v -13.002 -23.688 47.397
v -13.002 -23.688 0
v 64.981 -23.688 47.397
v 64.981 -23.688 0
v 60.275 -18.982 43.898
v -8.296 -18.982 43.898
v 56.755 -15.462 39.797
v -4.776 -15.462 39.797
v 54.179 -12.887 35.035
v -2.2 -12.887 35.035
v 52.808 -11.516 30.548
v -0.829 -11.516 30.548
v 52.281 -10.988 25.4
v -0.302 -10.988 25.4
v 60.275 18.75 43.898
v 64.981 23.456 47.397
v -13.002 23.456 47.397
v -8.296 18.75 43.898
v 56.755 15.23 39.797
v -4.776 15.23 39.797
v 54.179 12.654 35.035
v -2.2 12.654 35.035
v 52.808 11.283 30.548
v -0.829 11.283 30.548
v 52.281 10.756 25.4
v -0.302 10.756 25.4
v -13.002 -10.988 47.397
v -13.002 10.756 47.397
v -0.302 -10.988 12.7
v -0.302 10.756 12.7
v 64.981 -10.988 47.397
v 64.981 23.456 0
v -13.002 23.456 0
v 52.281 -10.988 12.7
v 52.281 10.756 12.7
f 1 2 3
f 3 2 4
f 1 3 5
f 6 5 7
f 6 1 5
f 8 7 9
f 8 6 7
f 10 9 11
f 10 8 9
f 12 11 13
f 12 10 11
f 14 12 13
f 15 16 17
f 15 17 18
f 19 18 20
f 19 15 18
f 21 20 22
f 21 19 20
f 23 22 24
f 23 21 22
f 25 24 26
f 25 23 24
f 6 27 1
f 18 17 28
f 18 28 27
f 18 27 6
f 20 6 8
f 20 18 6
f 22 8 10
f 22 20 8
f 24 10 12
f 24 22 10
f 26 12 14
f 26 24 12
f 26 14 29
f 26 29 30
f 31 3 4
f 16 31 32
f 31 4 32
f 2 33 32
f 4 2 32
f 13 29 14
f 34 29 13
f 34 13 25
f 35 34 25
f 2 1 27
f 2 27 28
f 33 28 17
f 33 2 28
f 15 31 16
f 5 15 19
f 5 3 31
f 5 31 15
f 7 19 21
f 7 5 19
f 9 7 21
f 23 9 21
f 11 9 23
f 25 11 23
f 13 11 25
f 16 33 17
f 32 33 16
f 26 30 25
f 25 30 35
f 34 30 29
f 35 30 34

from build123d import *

# Parameters (mm, degrees)
F0_W         = 77.9829304665
F0_H         = 47.1442025155
F1_DEPTH     = 50.8
F2_T         = -12.7
F3_T1_DEPTH  = 52.5829304665
F3_T3_DEPTH  = 21.7442025155
F3_T9_DEPTH  = 116.0829304665
F3_T15_DEPTH = 85.2442025155
F3_T24_DEPTH = 116.0829304665
F3_T30_DEPTH = 85.2442025155
F3_T39_DEPTH = 116.0829304665
F3_T45_DEPTH = 85.2442025155
F3_T54_DEPTH = 85.2442025155
F3_T60_DEPTH = 116.0829304665


# Not quite as in the source:
# - a fillet or chamfer that OpenCascade refuses, or shapes differently, is made with other operations: its cross-section is extruded or revolved along the edge and cut away or added


with BuildPart() as f1:
    # F0 (on Top) → F1 (new body)
    with BuildSketch(Plane.XY):
        with Locations((25.9893098846, -0.1163231209)):
            Rectangle(F0_W, F0_H)
    extrude(amount=F1_DEPTH)

    # F2
    f2_openings = [f1.faces().sort_by_distance(p)[0] for p in [
        (25.98931, -0.116323, 50.8),
    ]]
    offset(amount=F2_T, openings=f2_openings)

    # F3: fillet of radius 25.4 on 4 edges, made by hand

    # F3_s2 → F3_t1 (cut)
    with BuildSketch(Plane.YZ.offset(-0.3021553487)):
        with BuildLine():
            ThreePointArc((36.1557781368, 50.8), (18.1952658947, 43.3605122421), (10.7557781368, 25.4))
            Line((10.7557781368, 25.4), (10.7557781368, 50.8))
            Line((10.7557781368, 50.8), (36.1557781368, 50.8))
        make_face()
        with BuildLine():
            ThreePointArc((-36.3884243786, 50.8), (-18.4279121365, 43.3605122421), (-10.9884243786, 25.4))
            Line((-10.9884243786, 25.4), (-10.9884243786, 50.8))
            Line((-10.9884243786, 50.8), (-36.3884243786, 50.8))
        make_face()
    extrude(amount=F3_T1_DEPTH, mode=Mode.SUBTRACT)

    # F3_s4 → F3_t3 (cut)
    with BuildSketch(Plane.XZ.offset(-10.7557781368)):
        with BuildLine():
            ThreePointArc((-25.7021553487, 50.8), (-7.7416431065, 43.3605122421), (-0.3021553487, 25.4))
            Line((-0.3021553487, 25.4), (-0.3021553487, 50.8))
            Line((-0.3021553487, 50.8), (-25.7021553487, 50.8))
        make_face()
        with BuildLine():
            ThreePointArc((77.6807751179, 50.8), (59.7202628757, 43.3605122421), (52.2807751179, 25.4))
            Line((52.2807751179, 25.4), (52.2807751179, 50.8))
            Line((52.2807751179, 50.8), (77.6807751179, 50.8))
        make_face()
    extrude(amount=F3_T3_DEPTH, mode=Mode.SUBTRACT)


with BuildPart() as f3_tool7:
    # F3_s8 → F3_t9 (new body)
    with BuildSketch(Plane.YZ.offset(115.7807751179)):
        with BuildLine():
            ThreePointArc((36.1557781368, 50.8), (18.1952658947, 43.3605122421), (10.7557781368, 25.4))
            Line((10.7557781368, 25.4), (10.7557781368, 50.8))
            Line((10.7557781368, 50.8), (36.1557781368, 50.8))
        make_face()
    extrude(amount=-F3_T9_DEPTH)

    split(bisect_by=Plane.XZ.offset(-23.4557781368), keep=Keep.TOP)

    split(bisect_by=Plane.YZ.offset(64.9807751179), keep=Keep.BOTTOM)

    split(bisect_by=Plane.YZ.offset(52.2807751179), keep=Keep.TOP)


with BuildPart() as f3_tool13:
    # F3_s14 → F3_t15 (new body)
    with BuildSketch(Plane.XZ.offset(10.9884243786)):
        with BuildLine():
            ThreePointArc((77.6807751179, 50.8), (59.7202628757, 43.3605122421), (52.2807751179, 25.4))
            Line((52.2807751179, 25.4), (52.2807751179, 50.8))
            Line((52.2807751179, 50.8), (77.6807751179, 50.8))
        make_face()
    extrude(amount=-F3_T15_DEPTH)

    split(bisect_by=Plane.XZ.offset(-23.4557781368), keep=Keep.TOP)

    split(bisect_by=Plane.YZ.offset(64.9807751179), keep=Keep.BOTTOM)

    split(bisect_by=Plane.XZ.offset(-10.7557781368), keep=Keep.BOTTOM)


with BuildPart() as f3_tool7_1:
    add(f3_tool7.part)

    # F3_t19: intersect F3_tool13
    add(f3_tool13.part, mode=Mode.INTERSECT)


with BuildPart() as f1_1:
    add(f1.part)

    # F3_t5: cut F3_tool7
    add(f3_tool7_1.part, mode=Mode.SUBTRACT)


with BuildPart() as f3_tool22:
    # F3_s23 → F3_t24 (new body)
    with BuildSketch(Plane.YZ.offset(52.2807751179)):
        with BuildLine():
            ThreePointArc((36.1557781368, 50.8), (18.1952658947, 43.3605122421), (10.7557781368, 25.4))
            Line((10.7557781368, 25.4), (10.7557781368, 50.8))
            Line((10.7557781368, 50.8), (36.1557781368, 50.8))
        make_face()
    extrude(amount=-F3_T24_DEPTH)

    split(bisect_by=Plane.XZ.offset(-23.4557781368), keep=Keep.TOP)

    split(bisect_by=Plane.YZ.offset(-13.0021553487), keep=Keep.TOP)

    split(bisect_by=Plane.YZ.offset(-0.3021553487), keep=Keep.BOTTOM)


with BuildPart() as f3_tool28:
    # F3_s29 → F3_t30 (new body)
    with BuildSketch(Plane.XZ.offset(-74.2557781368)):
        with BuildLine():
            ThreePointArc((-25.7021553487, 50.8), (-7.7416431065, 43.3605122421), (-0.3021553487, 25.4))
            Line((-0.3021553487, 25.4), (-0.3021553487, 50.8))
            Line((-0.3021553487, 50.8), (-25.7021553487, 50.8))
        make_face()
    extrude(amount=F3_T30_DEPTH)

    split(bisect_by=Plane.XZ.offset(-23.4557781368), keep=Keep.TOP)

    split(bisect_by=Plane.YZ.offset(-13.0021553487), keep=Keep.TOP)

    split(bisect_by=Plane.XZ.offset(-10.7557781368), keep=Keep.BOTTOM)


with BuildPart() as f3_tool22_1:
    add(f3_tool22.part)

    # F3_t34: intersect F3_tool28
    add(f3_tool28.part, mode=Mode.INTERSECT)


with BuildPart() as f1_2:
    add(f1_1.part)

    # F3_t20: cut F3_tool22
    add(f3_tool22_1.part, mode=Mode.SUBTRACT)


with BuildPart() as f3_tool37:
    # F3_s38 → F3_t39 (new body)
    with BuildSketch(Plane.YZ.offset(-63.8021553487)):
        with BuildLine():
            ThreePointArc((-36.3884243786, 50.8), (-18.4279121365, 43.3605122421), (-10.9884243786, 25.4))
            Line((-10.9884243786, 25.4), (-10.9884243786, 50.8))
            Line((-10.9884243786, 50.8), (-36.3884243786, 50.8))
        make_face()
    extrude(amount=F3_T39_DEPTH)

    split(bisect_by=Plane.YZ.offset(-13.0021553487), keep=Keep.TOP)

    split(bisect_by=Plane.XZ.offset(23.6884243786), keep=Keep.BOTTOM)

    split(bisect_by=Plane.YZ.offset(-0.3021553487), keep=Keep.BOTTOM)


with BuildPart() as f3_tool43:
    # F3_s44 → F3_t45 (new body)
    with BuildSketch(Plane.XZ.offset(-10.7557781368)):
        with BuildLine():
            ThreePointArc((-25.7021553487, 50.8), (-7.7416431065, 43.3605122421), (-0.3021553487, 25.4))
            Line((-0.3021553487, 25.4), (-0.3021553487, 50.8))
            Line((-0.3021553487, 50.8), (-25.7021553487, 50.8))
        make_face()
    extrude(amount=F3_T45_DEPTH)

    split(bisect_by=Plane.YZ.offset(-13.0021553487), keep=Keep.TOP)

    split(bisect_by=Plane.XZ.offset(23.6884243786), keep=Keep.BOTTOM)

    split(bisect_by=Plane.XZ.offset(10.9884243786), keep=Keep.TOP)


with BuildPart() as f3_tool37_1:
    add(f3_tool37.part)

    # F3_t49: intersect F3_tool43
    add(f3_tool43.part, mode=Mode.INTERSECT)


with BuildPart() as f1_3:
    add(f1_2.part)

    # F3_t35: cut F3_tool37
    add(f3_tool37_1.part, mode=Mode.SUBTRACT)


with BuildPart() as f3_tool52:
    # F3_s53 → F3_t54 (new body)
    with BuildSketch(Plane.XZ.offset(74.4884243786)):
        with BuildLine():
            ThreePointArc((77.6807751179, 50.8), (59.7202628757, 43.3605122421), (52.2807751179, 25.4))
            Line((52.2807751179, 25.4), (52.2807751179, 50.8))
            Line((52.2807751179, 50.8), (77.6807751179, 50.8))
        make_face()
    extrude(amount=-F3_T54_DEPTH)

    split(bisect_by=Plane.XZ.offset(23.6884243786), keep=Keep.BOTTOM)

    split(bisect_by=Plane.YZ.offset(64.9807751179), keep=Keep.BOTTOM)

    split(bisect_by=Plane.XZ.offset(10.9884243786), keep=Keep.TOP)


with BuildPart() as f3_tool58:
    # F3_s59 → F3_t60 (new body)
    with BuildSketch(Plane.YZ.offset(-0.3021553487)):
        with BuildLine():
            ThreePointArc((-36.3884243786, 50.8), (-18.4279121365, 43.3605122421), (-10.9884243786, 25.4))
            Line((-10.9884243786, 25.4), (-10.9884243786, 50.8))
            Line((-10.9884243786, 50.8), (-36.3884243786, 50.8))
        make_face()
    extrude(amount=F3_T60_DEPTH)

    split(bisect_by=Plane.XZ.offset(23.6884243786), keep=Keep.BOTTOM)

    split(bisect_by=Plane.YZ.offset(64.9807751179), keep=Keep.BOTTOM)

    split(bisect_by=Plane.YZ.offset(52.2807751179), keep=Keep.TOP)


with BuildPart() as f3_tool52_1:
    add(f3_tool52.part)

    # F3_t64: intersect F3_tool58
    add(f3_tool58.part, mode=Mode.INTERSECT)


with BuildPart() as f1_4:
    add(f1_3.part)

    # F3_t50: cut F3_tool52
    add(f3_tool52_1.part, mode=Mode.SUBTRACT)


solid = f1_4.part
